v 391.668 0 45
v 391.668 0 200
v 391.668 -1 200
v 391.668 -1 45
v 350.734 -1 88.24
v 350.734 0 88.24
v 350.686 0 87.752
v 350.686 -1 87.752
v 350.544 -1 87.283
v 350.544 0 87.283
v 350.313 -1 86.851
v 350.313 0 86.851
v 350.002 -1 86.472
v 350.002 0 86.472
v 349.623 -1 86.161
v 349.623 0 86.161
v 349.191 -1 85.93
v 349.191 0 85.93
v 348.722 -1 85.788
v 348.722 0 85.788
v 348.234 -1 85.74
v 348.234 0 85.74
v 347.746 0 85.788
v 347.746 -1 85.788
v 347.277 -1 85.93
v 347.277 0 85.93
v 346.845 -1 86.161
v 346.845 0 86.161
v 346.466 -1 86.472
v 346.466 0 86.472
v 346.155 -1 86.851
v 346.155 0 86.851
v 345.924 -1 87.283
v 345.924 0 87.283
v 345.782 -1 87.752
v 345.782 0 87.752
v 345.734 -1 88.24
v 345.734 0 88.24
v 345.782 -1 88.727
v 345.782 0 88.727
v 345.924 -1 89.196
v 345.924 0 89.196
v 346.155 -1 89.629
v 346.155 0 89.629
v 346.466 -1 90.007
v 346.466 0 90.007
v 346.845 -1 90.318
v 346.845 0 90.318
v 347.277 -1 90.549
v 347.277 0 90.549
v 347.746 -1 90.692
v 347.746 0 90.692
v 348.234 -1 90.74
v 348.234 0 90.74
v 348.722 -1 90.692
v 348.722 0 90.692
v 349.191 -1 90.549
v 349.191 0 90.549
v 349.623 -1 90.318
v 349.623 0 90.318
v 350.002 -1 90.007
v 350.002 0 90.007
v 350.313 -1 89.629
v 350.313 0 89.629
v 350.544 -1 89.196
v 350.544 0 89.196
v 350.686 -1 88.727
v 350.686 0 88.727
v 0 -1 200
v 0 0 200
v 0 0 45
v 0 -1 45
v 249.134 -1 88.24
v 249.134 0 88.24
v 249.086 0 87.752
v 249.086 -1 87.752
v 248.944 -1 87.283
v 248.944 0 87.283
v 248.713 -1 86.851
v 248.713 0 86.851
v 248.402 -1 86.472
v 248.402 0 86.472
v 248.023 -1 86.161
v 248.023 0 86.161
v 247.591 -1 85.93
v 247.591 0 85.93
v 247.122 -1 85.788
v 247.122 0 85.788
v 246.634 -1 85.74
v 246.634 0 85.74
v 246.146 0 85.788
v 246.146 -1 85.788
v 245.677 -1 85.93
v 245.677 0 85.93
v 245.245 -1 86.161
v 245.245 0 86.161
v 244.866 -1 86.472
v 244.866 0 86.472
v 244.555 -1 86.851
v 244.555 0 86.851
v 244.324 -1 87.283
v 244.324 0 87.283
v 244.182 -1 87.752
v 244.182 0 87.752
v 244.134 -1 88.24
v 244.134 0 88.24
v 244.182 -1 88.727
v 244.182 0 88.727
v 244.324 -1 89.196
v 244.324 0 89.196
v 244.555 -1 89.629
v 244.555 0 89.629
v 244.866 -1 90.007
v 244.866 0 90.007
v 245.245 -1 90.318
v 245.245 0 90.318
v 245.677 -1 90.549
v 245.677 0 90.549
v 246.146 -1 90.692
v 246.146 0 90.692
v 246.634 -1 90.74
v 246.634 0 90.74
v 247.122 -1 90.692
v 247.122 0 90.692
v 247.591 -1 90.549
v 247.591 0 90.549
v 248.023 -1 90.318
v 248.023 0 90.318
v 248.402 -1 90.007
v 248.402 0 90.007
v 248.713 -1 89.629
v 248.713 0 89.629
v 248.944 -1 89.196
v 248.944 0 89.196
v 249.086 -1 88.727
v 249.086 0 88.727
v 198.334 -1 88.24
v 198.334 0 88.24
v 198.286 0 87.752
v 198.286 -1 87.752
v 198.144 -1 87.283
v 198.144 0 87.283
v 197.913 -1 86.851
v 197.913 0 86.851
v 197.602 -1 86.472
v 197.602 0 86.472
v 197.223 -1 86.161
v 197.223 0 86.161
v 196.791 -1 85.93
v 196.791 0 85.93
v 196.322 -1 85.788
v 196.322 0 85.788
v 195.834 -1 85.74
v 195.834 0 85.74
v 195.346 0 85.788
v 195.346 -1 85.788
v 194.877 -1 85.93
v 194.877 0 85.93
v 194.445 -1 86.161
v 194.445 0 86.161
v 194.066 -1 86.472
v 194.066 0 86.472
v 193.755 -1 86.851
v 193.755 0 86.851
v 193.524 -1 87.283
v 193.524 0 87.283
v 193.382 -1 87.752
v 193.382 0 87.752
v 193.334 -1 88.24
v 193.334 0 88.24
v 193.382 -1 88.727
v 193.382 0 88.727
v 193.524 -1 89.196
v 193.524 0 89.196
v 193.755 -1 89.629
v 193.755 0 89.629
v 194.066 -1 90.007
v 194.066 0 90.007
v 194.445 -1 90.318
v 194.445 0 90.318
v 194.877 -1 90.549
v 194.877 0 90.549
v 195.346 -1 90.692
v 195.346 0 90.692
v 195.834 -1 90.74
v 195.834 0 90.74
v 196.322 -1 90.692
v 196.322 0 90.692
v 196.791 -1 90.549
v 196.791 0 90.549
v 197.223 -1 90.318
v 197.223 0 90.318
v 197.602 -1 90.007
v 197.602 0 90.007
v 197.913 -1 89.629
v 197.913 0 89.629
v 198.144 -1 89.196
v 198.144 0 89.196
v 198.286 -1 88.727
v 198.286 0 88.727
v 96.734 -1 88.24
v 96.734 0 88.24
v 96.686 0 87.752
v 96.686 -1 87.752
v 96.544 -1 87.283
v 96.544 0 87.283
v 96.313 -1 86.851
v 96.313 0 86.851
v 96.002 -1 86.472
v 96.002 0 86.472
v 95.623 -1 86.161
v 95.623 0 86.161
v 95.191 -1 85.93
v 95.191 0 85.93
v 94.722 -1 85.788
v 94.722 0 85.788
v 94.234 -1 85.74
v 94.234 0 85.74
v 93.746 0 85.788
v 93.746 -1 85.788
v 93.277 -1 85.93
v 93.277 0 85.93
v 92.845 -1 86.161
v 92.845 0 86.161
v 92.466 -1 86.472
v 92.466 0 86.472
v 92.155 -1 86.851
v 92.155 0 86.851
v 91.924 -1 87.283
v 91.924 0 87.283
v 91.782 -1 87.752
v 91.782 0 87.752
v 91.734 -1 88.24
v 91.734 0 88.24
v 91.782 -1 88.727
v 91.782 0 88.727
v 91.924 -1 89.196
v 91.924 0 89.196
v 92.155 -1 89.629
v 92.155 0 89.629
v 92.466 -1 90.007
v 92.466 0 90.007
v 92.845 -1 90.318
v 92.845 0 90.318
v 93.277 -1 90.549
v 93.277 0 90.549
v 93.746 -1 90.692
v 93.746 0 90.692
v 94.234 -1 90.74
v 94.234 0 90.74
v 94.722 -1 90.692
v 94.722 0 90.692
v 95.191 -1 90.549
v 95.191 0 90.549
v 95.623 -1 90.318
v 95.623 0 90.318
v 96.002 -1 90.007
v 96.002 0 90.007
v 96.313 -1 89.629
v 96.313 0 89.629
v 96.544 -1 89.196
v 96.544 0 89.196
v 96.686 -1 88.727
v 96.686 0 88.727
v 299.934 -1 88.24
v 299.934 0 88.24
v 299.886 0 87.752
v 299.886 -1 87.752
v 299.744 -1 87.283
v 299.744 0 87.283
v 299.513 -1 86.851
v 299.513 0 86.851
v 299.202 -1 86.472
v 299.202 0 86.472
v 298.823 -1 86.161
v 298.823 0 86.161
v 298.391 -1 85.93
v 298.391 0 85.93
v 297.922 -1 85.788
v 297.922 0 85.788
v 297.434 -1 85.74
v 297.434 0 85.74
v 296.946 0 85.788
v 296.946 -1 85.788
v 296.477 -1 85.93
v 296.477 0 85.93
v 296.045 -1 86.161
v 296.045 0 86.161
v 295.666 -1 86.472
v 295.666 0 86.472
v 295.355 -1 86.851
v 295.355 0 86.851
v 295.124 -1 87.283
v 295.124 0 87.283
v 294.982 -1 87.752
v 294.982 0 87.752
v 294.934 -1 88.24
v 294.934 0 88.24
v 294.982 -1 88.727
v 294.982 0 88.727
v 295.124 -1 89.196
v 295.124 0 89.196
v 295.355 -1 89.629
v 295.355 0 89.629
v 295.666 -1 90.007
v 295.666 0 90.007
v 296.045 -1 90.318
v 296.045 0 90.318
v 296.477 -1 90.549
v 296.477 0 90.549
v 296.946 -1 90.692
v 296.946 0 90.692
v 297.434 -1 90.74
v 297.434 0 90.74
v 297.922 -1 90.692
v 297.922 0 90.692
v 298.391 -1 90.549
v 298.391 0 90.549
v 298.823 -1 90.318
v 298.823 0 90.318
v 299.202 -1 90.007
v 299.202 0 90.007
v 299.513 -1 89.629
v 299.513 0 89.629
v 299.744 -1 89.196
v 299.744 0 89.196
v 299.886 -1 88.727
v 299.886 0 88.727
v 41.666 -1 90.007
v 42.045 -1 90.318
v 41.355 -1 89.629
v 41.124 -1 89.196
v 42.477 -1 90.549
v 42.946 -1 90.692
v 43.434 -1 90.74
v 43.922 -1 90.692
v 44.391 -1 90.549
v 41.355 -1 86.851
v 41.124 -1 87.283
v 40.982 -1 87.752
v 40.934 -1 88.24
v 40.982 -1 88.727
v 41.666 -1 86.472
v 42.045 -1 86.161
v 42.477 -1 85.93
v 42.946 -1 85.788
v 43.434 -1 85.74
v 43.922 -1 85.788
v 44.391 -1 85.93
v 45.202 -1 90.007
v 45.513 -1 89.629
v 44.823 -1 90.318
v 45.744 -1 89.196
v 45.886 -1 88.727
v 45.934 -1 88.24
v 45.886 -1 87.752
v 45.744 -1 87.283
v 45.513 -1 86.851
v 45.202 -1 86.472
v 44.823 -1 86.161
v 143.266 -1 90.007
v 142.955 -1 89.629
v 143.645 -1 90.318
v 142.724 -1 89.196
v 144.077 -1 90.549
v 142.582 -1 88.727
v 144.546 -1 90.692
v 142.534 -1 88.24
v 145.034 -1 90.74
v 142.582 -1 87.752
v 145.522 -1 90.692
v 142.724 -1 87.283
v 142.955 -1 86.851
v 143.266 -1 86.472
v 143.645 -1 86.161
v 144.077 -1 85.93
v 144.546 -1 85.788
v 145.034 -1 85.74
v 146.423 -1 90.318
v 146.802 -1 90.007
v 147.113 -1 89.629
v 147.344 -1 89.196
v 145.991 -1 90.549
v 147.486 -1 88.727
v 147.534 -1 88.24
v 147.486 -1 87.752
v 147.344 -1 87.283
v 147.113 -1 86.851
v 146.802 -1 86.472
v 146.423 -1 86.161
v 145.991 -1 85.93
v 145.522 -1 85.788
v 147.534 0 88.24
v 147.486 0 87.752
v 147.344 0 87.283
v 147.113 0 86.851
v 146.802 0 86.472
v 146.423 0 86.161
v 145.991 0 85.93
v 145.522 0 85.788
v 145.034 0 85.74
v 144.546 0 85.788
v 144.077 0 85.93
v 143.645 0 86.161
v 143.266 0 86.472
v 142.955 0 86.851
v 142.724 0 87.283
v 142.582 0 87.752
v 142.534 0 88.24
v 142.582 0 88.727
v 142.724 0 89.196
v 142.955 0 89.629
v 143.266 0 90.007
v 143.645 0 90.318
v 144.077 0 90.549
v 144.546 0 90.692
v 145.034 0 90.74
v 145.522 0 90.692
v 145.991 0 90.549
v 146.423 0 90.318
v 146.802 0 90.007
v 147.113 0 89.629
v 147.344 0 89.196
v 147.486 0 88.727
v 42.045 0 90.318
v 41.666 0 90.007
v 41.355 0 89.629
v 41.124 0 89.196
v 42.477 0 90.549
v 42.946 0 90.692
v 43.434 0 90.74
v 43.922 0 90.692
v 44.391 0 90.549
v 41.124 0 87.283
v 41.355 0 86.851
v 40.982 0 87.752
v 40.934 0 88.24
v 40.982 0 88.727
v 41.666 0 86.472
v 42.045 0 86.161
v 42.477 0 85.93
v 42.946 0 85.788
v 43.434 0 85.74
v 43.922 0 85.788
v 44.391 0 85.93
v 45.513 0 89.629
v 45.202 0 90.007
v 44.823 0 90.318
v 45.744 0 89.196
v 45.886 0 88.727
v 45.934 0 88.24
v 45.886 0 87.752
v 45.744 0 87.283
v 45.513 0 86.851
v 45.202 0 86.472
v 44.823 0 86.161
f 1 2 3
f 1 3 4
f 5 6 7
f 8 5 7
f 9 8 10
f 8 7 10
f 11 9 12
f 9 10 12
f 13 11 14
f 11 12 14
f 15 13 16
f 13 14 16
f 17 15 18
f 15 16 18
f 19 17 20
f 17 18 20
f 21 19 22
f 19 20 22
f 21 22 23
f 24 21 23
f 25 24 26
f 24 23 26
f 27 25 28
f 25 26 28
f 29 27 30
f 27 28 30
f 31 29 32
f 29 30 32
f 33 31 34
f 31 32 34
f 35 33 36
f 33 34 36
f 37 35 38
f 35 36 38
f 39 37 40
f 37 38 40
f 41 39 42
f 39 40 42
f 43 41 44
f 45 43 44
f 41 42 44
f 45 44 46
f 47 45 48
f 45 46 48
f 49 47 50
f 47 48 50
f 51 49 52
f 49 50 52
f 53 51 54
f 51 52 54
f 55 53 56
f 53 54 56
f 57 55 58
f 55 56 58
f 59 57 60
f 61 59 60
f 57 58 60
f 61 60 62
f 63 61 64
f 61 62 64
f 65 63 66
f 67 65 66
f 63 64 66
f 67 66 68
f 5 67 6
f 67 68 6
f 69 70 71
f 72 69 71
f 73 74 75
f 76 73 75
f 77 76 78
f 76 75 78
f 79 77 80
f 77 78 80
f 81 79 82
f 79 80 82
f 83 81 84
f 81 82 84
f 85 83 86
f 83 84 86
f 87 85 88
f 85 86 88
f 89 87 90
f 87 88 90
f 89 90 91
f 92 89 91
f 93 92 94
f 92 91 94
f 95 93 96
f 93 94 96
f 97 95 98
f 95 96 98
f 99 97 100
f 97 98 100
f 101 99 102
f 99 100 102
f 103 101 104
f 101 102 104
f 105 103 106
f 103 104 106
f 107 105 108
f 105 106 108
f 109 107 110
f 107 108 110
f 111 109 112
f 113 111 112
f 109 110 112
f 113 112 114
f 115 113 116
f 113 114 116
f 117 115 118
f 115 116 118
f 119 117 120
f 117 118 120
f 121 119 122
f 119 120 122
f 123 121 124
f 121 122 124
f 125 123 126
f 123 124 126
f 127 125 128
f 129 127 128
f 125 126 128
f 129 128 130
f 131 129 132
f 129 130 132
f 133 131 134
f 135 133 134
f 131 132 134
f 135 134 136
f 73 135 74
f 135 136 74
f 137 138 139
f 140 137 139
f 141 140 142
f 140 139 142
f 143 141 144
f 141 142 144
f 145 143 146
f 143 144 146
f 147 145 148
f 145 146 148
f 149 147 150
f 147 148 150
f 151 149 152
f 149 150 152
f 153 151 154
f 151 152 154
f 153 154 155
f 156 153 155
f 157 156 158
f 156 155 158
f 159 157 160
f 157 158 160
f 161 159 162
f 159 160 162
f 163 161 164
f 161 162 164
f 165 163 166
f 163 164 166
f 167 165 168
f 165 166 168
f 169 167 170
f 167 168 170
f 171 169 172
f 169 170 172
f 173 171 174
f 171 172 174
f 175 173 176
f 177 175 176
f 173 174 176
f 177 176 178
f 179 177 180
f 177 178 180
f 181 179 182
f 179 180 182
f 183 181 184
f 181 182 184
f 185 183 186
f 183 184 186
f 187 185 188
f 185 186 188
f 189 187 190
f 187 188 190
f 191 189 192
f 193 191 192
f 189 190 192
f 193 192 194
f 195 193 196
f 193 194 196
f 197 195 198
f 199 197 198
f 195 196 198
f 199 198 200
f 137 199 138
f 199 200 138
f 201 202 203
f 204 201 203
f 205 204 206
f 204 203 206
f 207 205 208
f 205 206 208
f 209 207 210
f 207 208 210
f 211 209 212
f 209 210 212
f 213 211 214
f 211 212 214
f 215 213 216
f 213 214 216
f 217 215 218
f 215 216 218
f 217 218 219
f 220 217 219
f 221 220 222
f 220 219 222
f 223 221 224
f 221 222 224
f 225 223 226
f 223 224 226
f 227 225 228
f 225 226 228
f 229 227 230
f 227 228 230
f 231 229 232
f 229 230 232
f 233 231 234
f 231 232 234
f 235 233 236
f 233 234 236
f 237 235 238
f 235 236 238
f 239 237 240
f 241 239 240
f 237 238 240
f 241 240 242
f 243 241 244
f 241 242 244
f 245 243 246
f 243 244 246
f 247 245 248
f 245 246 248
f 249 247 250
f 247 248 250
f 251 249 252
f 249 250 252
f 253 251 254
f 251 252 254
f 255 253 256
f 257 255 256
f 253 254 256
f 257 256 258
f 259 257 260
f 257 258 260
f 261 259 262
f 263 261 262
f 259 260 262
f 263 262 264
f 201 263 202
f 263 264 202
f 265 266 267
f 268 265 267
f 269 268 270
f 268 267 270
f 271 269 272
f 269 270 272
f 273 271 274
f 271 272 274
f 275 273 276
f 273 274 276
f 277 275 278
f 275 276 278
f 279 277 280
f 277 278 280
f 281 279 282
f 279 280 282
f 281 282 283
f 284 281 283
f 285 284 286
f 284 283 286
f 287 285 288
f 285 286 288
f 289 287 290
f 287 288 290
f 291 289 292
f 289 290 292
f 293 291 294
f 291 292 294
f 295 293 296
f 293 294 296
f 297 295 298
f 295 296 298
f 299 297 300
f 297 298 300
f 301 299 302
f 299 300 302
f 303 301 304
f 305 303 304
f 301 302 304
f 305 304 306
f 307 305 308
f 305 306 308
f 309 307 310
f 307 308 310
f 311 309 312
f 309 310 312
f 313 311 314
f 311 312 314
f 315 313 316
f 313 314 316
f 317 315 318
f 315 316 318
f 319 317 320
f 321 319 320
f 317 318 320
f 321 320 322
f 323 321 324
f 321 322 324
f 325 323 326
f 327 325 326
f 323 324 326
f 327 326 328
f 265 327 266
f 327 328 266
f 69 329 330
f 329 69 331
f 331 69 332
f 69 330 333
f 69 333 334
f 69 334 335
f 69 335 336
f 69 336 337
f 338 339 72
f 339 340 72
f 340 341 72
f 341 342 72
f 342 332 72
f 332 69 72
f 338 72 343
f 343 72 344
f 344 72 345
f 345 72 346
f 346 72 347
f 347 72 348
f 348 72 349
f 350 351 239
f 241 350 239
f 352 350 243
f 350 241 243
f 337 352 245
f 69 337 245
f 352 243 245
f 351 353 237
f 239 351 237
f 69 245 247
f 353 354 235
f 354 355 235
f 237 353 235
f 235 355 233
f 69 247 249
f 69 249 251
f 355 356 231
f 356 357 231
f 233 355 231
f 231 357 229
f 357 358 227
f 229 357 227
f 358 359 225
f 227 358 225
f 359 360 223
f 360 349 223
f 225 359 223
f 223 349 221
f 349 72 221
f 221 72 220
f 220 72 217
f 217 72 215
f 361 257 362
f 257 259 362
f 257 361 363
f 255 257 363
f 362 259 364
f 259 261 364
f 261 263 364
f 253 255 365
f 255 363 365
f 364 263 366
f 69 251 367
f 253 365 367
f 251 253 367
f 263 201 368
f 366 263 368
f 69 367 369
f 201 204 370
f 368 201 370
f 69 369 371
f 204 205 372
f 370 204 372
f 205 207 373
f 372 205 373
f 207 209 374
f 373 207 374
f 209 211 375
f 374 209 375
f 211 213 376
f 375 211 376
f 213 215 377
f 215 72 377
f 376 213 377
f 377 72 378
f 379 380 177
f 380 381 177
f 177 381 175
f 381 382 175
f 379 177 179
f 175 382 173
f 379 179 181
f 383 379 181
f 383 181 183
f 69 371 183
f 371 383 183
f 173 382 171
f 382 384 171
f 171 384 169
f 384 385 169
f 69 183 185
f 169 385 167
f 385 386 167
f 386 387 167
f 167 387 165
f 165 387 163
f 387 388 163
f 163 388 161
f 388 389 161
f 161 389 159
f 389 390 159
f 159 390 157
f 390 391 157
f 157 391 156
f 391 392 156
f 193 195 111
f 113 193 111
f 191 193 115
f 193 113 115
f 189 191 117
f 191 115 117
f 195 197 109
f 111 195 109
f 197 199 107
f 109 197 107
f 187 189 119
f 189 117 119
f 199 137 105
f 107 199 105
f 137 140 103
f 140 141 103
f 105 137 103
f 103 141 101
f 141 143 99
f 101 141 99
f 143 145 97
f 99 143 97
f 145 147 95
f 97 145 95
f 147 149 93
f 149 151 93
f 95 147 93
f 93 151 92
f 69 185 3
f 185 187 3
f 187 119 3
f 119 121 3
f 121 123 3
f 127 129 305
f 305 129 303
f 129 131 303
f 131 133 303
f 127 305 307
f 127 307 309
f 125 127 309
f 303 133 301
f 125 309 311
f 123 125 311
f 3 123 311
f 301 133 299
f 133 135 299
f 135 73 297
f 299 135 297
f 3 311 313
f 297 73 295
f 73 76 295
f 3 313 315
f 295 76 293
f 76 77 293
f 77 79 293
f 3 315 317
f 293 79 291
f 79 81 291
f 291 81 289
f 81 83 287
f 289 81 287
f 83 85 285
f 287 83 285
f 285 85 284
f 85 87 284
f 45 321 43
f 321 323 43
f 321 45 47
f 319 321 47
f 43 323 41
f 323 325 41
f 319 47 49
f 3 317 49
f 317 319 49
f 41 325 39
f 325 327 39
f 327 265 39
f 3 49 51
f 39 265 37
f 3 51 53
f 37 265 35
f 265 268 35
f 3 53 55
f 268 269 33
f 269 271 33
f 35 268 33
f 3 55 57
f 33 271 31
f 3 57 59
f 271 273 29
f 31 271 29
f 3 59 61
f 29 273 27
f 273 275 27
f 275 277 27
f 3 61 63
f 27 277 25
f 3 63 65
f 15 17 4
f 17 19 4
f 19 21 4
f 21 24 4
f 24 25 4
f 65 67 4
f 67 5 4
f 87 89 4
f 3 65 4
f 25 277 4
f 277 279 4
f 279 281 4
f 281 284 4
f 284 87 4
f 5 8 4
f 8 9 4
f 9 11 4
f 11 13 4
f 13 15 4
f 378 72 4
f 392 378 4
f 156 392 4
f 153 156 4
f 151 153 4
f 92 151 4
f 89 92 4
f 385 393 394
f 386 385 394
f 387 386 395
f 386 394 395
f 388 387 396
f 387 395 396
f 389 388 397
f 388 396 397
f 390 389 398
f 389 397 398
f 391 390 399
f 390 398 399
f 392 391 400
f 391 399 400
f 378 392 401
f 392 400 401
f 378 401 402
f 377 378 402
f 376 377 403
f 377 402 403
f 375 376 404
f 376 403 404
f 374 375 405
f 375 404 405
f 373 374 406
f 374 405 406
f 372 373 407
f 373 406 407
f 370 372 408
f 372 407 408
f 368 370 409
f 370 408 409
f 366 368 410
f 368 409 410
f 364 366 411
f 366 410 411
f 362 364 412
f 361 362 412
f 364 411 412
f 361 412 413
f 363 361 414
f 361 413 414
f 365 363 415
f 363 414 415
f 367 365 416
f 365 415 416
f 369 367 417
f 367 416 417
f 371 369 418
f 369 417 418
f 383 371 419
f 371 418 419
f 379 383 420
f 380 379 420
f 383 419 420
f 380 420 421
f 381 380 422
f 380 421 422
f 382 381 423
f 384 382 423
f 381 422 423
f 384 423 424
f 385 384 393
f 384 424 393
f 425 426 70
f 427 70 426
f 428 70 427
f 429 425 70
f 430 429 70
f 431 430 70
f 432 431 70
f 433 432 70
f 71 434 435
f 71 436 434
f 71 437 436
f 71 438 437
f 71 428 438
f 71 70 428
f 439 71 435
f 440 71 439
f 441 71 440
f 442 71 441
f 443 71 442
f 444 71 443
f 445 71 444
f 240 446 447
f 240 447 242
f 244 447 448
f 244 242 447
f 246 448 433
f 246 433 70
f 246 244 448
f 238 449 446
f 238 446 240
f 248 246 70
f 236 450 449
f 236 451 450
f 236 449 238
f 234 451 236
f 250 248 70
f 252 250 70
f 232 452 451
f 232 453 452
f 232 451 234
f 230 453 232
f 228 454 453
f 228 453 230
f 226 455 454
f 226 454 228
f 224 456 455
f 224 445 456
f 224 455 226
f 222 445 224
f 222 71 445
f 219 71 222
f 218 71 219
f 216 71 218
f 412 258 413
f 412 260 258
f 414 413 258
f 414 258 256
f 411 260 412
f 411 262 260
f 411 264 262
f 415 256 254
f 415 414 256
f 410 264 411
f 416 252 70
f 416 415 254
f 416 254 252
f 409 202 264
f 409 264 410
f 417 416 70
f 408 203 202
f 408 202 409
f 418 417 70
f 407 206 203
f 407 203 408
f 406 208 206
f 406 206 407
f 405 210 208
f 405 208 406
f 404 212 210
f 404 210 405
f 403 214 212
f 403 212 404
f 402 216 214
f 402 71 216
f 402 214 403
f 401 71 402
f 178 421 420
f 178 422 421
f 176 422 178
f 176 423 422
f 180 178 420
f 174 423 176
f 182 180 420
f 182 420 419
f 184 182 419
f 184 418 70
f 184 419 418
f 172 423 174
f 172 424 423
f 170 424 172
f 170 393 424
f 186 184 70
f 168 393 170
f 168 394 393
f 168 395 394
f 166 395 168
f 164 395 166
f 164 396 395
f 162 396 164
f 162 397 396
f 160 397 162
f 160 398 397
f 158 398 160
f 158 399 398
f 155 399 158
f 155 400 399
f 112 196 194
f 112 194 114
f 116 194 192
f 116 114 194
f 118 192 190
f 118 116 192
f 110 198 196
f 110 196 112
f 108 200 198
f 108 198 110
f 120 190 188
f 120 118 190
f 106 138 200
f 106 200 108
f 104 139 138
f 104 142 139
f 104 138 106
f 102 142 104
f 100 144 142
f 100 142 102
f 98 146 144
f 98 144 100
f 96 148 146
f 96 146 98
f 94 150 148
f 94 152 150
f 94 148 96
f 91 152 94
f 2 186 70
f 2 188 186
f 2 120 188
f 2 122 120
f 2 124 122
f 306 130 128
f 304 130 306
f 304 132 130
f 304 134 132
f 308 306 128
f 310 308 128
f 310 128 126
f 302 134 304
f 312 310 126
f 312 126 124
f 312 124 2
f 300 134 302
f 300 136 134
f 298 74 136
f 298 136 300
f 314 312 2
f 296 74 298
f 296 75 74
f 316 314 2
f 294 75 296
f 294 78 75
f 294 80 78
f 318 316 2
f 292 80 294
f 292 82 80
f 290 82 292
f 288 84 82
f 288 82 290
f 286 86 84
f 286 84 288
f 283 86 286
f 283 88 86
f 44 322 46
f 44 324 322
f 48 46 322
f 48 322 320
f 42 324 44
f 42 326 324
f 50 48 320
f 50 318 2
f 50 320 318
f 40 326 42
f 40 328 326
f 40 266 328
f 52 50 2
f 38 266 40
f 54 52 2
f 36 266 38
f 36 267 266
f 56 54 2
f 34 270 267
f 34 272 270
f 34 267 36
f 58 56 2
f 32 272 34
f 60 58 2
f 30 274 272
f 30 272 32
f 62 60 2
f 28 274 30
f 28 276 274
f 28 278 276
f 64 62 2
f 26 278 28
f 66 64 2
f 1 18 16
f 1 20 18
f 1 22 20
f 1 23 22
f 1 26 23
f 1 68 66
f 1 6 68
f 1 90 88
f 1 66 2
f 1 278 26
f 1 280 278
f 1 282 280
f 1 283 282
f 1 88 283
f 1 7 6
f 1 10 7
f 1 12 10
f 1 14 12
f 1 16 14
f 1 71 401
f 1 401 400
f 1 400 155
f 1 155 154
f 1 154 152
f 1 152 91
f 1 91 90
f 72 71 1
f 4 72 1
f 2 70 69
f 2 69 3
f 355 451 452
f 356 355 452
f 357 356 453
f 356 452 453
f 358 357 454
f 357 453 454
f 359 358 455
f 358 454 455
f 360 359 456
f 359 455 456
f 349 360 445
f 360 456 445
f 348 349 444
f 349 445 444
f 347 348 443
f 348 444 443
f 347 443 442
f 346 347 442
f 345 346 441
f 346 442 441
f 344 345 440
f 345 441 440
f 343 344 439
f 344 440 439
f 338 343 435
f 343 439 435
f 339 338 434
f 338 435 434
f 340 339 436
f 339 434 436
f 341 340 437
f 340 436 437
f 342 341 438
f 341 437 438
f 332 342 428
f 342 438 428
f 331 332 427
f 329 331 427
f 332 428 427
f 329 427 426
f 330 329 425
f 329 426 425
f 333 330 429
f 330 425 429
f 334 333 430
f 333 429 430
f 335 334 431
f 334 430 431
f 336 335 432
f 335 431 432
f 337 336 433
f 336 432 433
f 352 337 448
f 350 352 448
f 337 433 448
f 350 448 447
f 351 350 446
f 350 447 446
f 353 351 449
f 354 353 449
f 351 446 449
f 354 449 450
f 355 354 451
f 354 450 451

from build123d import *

# Parameters (mm, degrees)
SKETCH1_W               = 391.668
SKETCH1_H               = 199.9996
SKETCH1_R               = 2.5
BOSS_EXTRUDE1_DEPTH     = 1
SKETCH2_W               = 391.668
SKETCH2_H               = 45
CUT_EXTRUDE1_DEPTH      = 1
CUT_EXTRUDE1_DEPTH_BACK = 2


with BuildPart() as part:
    # Sketch1 → Boss-Extrude1 (new body)
    with BuildSketch(Plane(origin=(0, 0, 0), x_dir=(1, 0, 0), z_dir=(0, 1, 0))):
        with Locations((195.834, -99.9998)):
            Rectangle(SKETCH1_W, SKETCH1_H)
        with Locations((348.234, -88.2396)):
            Circle(SKETCH1_R, mode=Mode.SUBTRACT)
        with Locations((297.434, -88.2396)):
            Circle(SKETCH1_R, mode=Mode.SUBTRACT)
        with Locations((246.634, -88.2396)):
            Circle(SKETCH1_R, mode=Mode.SUBTRACT)
        with Locations((43.434, -88.2396)):
            Circle(SKETCH1_R, mode=Mode.SUBTRACT)
        with Locations((94.234, -88.2396)):
            Circle(SKETCH1_R, mode=Mode.SUBTRACT)
        with Locations((145.034, -88.2396)):
            Circle(SKETCH1_R, mode=Mode.SUBTRACT)
        with Locations((195.834, -88.2396)):
            Circle(SKETCH1_R, mode=Mode.SUBTRACT)
    extrude(amount=-BOSS_EXTRUDE1_DEPTH)

    # Sketch2 → Cut-Extrude1 (cut, two sides)
    with BuildSketch(Plane(origin=(0, 0, 0), x_dir=(1, 0, 0), z_dir=(0, 1, 0))) as cut_extrude1_sk:
        with Locations((195.834, -22.5)):
            Rectangle(SKETCH2_W, SKETCH2_H)
    extrude(amount=CUT_EXTRUDE1_DEPTH, mode=Mode.SUBTRACT)
    extrude(cut_extrude1_sk.sketch, amount=-CUT_EXTRUDE1_DEPTH_BACK, mode=Mode.SUBTRACT)


solid = part.part
